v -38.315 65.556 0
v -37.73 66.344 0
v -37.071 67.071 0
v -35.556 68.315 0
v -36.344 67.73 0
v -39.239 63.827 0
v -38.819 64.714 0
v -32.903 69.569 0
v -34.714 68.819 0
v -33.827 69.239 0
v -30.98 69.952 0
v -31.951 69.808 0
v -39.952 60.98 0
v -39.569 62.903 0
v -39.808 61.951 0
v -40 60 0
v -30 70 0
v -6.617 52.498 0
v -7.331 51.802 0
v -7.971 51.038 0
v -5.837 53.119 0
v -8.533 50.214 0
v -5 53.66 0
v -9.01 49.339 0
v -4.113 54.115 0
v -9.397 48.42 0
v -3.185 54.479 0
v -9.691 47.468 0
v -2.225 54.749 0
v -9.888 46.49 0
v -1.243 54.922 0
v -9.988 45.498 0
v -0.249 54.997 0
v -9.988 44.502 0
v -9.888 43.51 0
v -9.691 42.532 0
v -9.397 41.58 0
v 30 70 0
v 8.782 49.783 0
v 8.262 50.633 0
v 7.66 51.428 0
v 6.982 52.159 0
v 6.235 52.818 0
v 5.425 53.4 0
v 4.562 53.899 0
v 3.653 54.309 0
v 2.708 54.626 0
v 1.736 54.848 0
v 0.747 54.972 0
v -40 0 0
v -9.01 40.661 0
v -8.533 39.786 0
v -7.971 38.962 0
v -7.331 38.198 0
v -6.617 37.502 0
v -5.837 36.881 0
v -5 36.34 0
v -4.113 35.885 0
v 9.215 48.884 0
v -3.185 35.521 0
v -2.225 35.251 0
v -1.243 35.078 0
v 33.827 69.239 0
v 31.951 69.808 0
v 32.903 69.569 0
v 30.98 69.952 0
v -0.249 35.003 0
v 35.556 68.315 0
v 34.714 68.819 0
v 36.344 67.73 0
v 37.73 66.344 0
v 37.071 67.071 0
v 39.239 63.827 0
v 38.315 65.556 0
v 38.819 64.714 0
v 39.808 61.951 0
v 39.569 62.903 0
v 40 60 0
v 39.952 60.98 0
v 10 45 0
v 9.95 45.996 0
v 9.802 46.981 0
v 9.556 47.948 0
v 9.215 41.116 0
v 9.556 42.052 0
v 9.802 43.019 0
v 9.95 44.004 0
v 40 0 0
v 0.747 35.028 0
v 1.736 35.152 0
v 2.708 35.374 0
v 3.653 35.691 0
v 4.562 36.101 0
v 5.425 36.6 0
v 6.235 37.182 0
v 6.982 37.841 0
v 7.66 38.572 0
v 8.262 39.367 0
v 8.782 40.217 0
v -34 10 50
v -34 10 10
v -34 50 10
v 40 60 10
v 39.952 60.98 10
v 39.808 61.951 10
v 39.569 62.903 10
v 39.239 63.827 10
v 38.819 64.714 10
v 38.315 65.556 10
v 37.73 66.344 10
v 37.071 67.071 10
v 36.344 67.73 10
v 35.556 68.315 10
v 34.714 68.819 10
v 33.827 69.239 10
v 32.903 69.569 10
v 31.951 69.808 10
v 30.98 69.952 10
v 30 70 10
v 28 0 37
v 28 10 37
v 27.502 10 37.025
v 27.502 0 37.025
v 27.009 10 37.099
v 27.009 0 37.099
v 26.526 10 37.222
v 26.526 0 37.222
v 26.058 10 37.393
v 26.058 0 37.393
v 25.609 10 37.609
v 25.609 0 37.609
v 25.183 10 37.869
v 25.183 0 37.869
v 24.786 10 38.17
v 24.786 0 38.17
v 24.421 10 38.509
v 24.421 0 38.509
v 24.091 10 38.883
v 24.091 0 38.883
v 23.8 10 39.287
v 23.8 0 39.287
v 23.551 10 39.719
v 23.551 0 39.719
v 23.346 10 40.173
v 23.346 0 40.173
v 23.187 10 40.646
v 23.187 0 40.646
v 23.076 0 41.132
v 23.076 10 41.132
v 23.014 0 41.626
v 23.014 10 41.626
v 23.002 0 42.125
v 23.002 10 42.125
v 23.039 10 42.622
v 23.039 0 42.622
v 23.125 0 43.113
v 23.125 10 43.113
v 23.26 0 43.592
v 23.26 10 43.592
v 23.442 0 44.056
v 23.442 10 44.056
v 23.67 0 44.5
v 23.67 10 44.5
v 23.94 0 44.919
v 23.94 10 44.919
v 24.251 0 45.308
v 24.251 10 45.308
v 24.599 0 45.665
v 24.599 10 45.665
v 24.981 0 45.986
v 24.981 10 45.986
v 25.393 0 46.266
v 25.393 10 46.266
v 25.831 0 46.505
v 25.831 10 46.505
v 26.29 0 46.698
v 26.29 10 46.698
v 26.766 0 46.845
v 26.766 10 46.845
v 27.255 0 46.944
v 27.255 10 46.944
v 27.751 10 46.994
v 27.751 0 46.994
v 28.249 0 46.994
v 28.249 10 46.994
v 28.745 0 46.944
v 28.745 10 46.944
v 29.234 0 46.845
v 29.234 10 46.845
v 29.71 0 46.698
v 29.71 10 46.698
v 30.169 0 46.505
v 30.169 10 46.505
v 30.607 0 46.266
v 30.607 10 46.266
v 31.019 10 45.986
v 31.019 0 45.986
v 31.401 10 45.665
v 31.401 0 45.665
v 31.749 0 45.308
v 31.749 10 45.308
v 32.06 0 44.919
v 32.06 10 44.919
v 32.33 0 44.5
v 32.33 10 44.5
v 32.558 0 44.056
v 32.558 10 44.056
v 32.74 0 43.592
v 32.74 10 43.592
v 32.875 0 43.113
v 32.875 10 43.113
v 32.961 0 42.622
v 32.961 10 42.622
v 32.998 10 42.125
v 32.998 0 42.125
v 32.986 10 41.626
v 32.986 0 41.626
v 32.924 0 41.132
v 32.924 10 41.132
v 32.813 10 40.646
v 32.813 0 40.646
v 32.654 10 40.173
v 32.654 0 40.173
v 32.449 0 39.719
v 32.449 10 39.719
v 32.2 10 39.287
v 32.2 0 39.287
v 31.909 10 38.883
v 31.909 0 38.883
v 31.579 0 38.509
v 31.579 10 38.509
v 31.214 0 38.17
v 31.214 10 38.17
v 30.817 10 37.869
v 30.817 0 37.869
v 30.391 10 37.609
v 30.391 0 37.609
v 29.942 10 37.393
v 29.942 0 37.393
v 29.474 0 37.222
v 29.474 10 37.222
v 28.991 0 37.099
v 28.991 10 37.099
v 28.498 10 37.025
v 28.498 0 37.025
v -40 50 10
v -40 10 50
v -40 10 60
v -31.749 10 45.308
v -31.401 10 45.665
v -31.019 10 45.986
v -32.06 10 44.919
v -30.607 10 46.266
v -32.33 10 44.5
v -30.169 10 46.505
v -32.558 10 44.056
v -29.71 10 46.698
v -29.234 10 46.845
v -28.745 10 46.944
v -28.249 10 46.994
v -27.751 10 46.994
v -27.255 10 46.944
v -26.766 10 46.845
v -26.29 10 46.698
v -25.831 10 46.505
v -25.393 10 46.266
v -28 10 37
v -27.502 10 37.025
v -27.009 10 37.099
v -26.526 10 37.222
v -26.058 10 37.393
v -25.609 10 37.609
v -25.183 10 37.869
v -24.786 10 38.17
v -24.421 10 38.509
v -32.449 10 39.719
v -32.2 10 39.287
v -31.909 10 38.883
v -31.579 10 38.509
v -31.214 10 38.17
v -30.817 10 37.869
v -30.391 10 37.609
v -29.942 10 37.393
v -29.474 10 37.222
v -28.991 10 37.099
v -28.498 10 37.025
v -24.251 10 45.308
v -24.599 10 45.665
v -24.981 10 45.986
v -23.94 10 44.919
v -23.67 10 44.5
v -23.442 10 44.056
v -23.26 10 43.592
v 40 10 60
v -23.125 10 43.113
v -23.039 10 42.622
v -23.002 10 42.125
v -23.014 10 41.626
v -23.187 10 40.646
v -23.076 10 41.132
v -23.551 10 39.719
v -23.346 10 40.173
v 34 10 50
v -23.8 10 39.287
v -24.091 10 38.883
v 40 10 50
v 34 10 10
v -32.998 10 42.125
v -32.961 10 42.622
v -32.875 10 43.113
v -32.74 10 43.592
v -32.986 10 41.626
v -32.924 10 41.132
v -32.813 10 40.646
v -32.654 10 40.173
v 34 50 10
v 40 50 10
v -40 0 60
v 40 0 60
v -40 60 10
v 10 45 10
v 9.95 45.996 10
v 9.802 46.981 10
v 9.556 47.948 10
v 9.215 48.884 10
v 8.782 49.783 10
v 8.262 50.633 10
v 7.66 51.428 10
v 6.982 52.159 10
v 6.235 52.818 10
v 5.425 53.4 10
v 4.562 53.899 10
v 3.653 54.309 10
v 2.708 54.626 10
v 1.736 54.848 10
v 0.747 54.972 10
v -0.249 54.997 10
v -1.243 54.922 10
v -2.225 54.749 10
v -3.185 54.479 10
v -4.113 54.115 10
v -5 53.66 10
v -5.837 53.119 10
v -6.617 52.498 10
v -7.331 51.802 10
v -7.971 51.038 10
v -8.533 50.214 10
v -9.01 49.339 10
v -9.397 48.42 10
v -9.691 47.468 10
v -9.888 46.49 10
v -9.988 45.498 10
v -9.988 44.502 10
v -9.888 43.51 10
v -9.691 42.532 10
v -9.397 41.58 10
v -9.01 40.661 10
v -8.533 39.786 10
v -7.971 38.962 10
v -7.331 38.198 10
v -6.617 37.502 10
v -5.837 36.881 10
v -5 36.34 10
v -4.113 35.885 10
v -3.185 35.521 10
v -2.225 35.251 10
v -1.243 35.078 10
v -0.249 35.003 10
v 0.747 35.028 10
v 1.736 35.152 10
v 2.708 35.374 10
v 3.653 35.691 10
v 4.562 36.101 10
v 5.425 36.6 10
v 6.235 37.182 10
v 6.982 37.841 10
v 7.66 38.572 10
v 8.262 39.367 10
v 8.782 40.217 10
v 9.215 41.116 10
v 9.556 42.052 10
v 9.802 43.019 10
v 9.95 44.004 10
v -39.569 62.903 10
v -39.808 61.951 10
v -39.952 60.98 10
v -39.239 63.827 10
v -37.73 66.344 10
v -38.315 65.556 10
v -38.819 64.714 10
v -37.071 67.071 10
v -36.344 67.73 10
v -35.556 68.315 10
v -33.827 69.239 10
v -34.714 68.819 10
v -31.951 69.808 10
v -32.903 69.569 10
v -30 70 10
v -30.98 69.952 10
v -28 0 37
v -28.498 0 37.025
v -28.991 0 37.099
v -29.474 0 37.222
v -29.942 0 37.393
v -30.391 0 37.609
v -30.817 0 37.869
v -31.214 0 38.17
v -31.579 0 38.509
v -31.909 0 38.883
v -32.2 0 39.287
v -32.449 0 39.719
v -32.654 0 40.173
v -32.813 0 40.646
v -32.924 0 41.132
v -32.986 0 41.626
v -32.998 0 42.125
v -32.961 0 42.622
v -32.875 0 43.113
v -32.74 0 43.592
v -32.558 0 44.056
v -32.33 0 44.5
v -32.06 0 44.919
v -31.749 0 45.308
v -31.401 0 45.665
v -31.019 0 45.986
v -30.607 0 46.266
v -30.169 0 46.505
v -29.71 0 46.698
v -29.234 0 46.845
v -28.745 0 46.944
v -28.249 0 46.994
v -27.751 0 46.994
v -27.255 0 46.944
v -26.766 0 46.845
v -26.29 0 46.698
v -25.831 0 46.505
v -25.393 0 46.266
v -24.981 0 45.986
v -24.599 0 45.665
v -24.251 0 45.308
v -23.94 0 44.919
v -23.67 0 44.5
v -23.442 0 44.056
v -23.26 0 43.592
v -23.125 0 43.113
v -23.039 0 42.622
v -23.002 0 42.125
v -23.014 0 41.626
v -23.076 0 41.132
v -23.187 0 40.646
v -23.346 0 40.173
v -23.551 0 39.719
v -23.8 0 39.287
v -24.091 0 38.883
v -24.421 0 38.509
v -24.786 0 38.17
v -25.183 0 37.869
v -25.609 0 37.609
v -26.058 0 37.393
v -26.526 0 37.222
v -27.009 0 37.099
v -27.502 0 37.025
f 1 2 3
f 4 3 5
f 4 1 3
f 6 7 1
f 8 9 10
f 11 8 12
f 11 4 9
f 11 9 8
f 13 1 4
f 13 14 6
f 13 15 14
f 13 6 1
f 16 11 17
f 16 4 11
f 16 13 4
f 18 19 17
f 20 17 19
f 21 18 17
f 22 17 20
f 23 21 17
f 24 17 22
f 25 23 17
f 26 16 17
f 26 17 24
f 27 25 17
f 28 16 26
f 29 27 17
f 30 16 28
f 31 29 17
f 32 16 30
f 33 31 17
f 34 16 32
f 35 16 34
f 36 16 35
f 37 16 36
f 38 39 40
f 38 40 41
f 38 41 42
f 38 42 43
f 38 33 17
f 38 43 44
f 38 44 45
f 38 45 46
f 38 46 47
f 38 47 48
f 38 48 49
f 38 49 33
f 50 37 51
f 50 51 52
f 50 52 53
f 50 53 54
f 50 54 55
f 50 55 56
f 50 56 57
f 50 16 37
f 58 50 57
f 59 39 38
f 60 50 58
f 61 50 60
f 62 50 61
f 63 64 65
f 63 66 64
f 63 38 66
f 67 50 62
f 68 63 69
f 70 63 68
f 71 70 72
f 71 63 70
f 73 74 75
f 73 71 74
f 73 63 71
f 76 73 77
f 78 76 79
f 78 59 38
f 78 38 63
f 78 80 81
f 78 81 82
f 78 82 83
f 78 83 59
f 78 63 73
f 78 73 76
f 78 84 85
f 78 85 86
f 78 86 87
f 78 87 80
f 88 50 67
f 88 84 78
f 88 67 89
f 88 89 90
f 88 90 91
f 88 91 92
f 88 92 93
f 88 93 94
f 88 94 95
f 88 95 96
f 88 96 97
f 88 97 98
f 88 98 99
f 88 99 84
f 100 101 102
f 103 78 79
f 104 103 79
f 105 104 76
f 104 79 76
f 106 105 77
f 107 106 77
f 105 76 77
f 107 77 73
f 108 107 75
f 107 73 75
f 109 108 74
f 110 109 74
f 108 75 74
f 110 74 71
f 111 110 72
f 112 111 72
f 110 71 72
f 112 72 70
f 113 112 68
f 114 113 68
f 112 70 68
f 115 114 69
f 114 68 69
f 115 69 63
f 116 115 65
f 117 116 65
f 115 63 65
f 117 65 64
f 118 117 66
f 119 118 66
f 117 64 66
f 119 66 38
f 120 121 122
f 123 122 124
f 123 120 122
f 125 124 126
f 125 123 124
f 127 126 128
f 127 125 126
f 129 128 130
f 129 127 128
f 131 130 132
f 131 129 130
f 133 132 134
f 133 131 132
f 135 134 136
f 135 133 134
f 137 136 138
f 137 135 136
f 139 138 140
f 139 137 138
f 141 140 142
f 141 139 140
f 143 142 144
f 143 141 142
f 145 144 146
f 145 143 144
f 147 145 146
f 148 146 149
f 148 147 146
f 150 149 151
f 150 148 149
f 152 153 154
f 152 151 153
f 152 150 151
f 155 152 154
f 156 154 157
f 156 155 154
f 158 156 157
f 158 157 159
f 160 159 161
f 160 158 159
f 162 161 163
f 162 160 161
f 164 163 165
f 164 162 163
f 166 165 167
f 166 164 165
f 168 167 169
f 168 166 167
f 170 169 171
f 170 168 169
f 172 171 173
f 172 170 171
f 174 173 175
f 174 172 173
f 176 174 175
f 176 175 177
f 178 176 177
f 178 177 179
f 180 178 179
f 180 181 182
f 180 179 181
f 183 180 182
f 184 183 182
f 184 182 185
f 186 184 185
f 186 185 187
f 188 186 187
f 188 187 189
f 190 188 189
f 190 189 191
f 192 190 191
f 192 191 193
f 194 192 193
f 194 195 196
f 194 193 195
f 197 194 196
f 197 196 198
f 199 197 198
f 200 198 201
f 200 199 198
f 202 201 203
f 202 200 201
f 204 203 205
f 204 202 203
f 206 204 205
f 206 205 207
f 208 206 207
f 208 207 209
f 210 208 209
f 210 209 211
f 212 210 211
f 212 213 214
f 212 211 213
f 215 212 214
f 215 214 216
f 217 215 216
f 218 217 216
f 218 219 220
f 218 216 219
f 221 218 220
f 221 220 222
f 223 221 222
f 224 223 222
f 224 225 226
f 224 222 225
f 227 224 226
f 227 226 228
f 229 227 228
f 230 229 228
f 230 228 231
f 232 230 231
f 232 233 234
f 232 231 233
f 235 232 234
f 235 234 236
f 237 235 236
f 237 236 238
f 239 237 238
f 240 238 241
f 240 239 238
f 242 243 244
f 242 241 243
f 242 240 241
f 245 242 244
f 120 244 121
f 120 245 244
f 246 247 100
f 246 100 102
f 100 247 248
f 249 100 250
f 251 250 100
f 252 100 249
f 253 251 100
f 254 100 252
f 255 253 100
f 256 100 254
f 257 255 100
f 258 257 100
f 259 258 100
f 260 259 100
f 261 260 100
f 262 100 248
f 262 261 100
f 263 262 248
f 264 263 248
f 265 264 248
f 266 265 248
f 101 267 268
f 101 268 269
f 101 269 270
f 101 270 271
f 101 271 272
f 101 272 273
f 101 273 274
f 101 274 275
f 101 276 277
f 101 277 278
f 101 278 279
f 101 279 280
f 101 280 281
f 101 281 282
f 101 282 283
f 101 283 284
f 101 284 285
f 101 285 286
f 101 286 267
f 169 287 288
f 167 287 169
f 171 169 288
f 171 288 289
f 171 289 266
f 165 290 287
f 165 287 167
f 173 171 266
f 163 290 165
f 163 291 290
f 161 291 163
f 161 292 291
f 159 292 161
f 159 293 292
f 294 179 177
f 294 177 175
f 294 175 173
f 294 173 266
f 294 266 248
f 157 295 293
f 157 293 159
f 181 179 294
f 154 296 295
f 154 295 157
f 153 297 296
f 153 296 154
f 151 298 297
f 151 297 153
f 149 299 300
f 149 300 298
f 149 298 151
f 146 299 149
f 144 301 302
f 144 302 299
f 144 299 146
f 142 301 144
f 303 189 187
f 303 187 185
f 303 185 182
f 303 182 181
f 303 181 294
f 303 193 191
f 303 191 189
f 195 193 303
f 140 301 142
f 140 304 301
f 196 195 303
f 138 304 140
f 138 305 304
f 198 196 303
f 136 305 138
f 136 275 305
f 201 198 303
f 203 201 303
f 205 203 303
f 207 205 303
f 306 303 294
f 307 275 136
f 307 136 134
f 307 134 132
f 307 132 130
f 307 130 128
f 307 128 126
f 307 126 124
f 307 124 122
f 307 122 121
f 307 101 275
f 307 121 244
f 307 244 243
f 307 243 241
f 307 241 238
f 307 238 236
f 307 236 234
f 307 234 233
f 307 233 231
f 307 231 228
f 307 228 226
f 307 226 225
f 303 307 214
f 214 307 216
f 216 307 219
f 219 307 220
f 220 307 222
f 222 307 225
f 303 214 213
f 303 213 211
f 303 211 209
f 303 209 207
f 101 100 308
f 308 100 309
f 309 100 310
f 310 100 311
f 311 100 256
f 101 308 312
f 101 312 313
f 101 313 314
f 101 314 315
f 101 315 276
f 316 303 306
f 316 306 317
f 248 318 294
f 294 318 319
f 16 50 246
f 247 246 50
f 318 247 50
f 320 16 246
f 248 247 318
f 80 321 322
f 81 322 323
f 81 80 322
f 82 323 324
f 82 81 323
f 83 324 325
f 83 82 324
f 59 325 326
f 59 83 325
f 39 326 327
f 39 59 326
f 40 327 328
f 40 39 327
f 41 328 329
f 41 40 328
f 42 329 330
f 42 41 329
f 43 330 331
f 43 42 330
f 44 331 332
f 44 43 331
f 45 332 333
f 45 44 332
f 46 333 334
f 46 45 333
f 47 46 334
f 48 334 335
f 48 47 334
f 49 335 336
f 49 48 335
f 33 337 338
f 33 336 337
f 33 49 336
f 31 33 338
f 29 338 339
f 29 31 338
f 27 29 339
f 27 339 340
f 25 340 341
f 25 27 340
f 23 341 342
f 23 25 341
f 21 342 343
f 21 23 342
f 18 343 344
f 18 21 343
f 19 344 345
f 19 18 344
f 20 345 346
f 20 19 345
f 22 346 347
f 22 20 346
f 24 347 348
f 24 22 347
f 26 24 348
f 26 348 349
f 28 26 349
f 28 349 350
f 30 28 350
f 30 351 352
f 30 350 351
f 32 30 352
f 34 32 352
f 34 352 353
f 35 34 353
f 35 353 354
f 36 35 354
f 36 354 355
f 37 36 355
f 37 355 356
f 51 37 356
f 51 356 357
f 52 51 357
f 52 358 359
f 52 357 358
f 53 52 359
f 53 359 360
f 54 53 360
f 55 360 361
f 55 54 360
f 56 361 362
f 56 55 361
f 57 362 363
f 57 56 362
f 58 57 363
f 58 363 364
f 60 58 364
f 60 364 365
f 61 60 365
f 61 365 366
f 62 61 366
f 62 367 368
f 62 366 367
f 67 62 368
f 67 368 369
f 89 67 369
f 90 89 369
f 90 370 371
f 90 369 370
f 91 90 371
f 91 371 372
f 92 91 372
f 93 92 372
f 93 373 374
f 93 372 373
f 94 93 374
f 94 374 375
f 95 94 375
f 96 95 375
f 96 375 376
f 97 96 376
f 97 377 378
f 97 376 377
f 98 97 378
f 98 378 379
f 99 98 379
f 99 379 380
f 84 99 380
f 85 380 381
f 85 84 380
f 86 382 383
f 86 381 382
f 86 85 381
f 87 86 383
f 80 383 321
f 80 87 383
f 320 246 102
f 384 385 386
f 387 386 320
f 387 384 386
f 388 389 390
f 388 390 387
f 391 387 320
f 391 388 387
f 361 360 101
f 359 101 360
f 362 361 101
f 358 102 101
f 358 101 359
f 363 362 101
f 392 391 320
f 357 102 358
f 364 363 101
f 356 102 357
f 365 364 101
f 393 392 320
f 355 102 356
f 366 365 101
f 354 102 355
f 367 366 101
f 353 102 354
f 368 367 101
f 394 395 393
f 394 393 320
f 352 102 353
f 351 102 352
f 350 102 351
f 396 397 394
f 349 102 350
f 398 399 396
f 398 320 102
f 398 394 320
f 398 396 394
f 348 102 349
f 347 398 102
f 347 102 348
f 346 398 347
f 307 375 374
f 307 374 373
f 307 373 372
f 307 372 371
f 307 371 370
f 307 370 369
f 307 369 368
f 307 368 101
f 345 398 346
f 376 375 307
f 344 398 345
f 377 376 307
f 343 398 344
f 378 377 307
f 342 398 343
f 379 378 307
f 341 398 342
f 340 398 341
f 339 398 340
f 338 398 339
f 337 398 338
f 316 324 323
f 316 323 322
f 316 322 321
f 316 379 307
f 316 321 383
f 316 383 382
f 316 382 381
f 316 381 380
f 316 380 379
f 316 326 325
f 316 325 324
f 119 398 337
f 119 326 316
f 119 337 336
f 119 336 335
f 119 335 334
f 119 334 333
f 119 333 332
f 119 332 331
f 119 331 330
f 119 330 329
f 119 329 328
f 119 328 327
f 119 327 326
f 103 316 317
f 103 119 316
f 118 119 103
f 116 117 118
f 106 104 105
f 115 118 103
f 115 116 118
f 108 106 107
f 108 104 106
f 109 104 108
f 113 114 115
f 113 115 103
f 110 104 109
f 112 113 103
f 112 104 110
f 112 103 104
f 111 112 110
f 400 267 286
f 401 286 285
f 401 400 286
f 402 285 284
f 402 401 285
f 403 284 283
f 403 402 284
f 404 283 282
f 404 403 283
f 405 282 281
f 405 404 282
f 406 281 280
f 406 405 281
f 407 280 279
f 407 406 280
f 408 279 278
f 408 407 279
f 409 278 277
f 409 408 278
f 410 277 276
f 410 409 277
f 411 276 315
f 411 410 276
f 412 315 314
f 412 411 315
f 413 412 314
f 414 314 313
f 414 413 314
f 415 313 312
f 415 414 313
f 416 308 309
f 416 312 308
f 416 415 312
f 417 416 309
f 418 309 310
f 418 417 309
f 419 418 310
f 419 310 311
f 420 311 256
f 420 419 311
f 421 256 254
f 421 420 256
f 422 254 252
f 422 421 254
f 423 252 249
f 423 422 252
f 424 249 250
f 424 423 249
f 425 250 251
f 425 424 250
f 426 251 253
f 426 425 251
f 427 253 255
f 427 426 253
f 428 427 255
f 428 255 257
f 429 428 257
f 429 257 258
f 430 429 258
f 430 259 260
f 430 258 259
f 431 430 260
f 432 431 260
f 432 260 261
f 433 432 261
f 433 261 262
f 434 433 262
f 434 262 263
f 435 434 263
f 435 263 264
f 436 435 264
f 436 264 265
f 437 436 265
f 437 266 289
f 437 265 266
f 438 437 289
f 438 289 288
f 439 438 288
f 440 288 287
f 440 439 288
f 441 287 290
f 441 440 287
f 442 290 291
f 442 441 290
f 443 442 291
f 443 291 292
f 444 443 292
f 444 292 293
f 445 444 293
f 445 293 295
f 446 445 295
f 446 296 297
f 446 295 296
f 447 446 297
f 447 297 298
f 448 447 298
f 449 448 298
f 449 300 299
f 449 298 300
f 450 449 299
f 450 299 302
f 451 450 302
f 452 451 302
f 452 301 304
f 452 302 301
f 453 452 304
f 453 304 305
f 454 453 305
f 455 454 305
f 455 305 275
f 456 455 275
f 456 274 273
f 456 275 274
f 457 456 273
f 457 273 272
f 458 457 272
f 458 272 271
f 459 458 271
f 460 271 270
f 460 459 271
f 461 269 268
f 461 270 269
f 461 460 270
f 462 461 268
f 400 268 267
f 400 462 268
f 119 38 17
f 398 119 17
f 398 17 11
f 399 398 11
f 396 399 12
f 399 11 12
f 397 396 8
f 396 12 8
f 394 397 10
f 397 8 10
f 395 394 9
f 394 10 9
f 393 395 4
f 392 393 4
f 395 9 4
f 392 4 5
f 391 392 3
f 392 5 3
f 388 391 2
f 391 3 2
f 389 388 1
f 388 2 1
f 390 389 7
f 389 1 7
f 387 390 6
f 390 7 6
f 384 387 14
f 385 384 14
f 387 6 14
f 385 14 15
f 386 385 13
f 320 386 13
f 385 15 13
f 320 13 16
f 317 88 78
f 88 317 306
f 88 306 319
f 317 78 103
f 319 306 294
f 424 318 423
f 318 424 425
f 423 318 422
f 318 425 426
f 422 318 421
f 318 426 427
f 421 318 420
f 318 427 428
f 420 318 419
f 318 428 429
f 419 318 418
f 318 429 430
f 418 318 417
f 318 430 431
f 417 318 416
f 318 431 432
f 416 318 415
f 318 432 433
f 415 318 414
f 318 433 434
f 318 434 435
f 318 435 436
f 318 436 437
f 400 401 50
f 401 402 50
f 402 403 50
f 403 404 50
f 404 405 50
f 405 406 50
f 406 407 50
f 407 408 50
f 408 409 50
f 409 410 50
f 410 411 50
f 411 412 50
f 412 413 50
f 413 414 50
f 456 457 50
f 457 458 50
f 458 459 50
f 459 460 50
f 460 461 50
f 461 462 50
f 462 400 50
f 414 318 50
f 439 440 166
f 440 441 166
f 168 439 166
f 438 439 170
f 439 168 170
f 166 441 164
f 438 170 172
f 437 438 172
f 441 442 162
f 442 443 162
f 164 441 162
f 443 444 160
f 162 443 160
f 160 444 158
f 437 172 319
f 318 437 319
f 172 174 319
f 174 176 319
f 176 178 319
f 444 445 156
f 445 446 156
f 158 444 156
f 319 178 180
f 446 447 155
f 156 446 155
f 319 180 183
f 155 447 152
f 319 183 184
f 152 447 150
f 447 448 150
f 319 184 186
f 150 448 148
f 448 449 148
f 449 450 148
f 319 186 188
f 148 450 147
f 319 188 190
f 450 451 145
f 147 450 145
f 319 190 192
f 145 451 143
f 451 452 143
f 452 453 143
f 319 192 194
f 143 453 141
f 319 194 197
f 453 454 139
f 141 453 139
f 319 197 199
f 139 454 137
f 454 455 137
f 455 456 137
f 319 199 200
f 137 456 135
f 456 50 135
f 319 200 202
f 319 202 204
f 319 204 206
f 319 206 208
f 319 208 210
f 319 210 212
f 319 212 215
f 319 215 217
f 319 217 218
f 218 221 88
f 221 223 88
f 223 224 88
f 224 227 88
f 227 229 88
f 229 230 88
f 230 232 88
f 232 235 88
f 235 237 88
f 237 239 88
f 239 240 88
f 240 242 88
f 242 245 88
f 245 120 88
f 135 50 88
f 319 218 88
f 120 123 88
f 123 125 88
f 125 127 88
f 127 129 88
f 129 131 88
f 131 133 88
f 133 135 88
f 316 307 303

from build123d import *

# Parameters (mm, degrees)
SKETCH_5_W          = 80
SKETCH_5_H          = 60
EXTRUDE_5_DEPTH     = 10
EXTRUDE_6_DEPTH     = 10
EXTRUDE_9_DEPTH     = 6
EXTRUDE_10_DEPTH    = 6
SKETCH_11_R         = 10
CUT_EXTRUDE_1_DEPTH = 101.498756211
SKETCH_13_R         = 5
CUT_EXTRUDE_3_DEPTH = 101.498756211


with BuildPart() as part:
    # 草图5 → 凸台-拉伸5 (new body)
    with BuildSketch(Plane(origin=(0, 0, 0), x_dir=(1, 0, 0), z_dir=(0, 1, 0))):
        with Locations((0, -30)):
            Rectangle(SKETCH_5_W, SKETCH_5_H)
    extrude(amount=EXTRUDE_5_DEPTH)

    # 草图6 → 凸台-拉伸6 (add)
    with BuildSketch(Plane.XY):
        with BuildLine():
            Line((-40, 0), (40, 0))
            Line((40, 0), (40, 60))
            ThreePointArc((40, 60), (37.071067812, 67.071067812), (30, 70))
            Line((30, 70), (-30, 70))
            ThreePointArc((-30, 70), (-37.071067812, 67.071067812), (-40, 60))
            Line((-40, 60), (-40, 0))
        make_face()
    extrude(amount=EXTRUDE_6_DEPTH)

    # 草图9 → 凸台-拉伸9 (add)
    with BuildSketch(Plane(origin=(-40, 0, 0), x_dir=(0, 0, -1), z_dir=(1, 0, 0))):
        Polygon((-10, 10), (-50, 10), (-10, 50), align=None)
    extrude(amount=EXTRUDE_9_DEPTH)

    # 草图10 → 凸台-拉伸10 (add)
    with BuildSketch(Plane(origin=(34, 0, 0), x_dir=(0, 0, -1), z_dir=(1, 0, 0))):
        Polygon((-10, 10), (-50, 10), (-10, 50), align=None)
    extrude(amount=EXTRUDE_10_DEPTH)

    # 草图11 → 切除-拉伸1 (cut, through all)
    with BuildSketch(Plane.XY):
        with Locations((0, 45)):
            Circle(SKETCH_11_R)
    extrude(amount=CUT_EXTRUDE_1_DEPTH, mode=Mode.SUBTRACT)

    # 草图13 → 切除-拉伸3 (cut, through all)
    with BuildSketch(Plane(origin=(0, 0, 0), x_dir=(1, 0, 0), z_dir=(0, 1, 0))):
        with Locations(Location((-28, -42, 0), (0, 0, 90))):
            Circle(SKETCH_13_R)
        with Locations(Location((28, -42, 0), (0, 0, 90))):
            Circle(SKETCH_13_R)
    extrude(amount=CUT_EXTRUDE_3_DEPTH, mode=Mode.SUBTRACT)


solid = part.part
